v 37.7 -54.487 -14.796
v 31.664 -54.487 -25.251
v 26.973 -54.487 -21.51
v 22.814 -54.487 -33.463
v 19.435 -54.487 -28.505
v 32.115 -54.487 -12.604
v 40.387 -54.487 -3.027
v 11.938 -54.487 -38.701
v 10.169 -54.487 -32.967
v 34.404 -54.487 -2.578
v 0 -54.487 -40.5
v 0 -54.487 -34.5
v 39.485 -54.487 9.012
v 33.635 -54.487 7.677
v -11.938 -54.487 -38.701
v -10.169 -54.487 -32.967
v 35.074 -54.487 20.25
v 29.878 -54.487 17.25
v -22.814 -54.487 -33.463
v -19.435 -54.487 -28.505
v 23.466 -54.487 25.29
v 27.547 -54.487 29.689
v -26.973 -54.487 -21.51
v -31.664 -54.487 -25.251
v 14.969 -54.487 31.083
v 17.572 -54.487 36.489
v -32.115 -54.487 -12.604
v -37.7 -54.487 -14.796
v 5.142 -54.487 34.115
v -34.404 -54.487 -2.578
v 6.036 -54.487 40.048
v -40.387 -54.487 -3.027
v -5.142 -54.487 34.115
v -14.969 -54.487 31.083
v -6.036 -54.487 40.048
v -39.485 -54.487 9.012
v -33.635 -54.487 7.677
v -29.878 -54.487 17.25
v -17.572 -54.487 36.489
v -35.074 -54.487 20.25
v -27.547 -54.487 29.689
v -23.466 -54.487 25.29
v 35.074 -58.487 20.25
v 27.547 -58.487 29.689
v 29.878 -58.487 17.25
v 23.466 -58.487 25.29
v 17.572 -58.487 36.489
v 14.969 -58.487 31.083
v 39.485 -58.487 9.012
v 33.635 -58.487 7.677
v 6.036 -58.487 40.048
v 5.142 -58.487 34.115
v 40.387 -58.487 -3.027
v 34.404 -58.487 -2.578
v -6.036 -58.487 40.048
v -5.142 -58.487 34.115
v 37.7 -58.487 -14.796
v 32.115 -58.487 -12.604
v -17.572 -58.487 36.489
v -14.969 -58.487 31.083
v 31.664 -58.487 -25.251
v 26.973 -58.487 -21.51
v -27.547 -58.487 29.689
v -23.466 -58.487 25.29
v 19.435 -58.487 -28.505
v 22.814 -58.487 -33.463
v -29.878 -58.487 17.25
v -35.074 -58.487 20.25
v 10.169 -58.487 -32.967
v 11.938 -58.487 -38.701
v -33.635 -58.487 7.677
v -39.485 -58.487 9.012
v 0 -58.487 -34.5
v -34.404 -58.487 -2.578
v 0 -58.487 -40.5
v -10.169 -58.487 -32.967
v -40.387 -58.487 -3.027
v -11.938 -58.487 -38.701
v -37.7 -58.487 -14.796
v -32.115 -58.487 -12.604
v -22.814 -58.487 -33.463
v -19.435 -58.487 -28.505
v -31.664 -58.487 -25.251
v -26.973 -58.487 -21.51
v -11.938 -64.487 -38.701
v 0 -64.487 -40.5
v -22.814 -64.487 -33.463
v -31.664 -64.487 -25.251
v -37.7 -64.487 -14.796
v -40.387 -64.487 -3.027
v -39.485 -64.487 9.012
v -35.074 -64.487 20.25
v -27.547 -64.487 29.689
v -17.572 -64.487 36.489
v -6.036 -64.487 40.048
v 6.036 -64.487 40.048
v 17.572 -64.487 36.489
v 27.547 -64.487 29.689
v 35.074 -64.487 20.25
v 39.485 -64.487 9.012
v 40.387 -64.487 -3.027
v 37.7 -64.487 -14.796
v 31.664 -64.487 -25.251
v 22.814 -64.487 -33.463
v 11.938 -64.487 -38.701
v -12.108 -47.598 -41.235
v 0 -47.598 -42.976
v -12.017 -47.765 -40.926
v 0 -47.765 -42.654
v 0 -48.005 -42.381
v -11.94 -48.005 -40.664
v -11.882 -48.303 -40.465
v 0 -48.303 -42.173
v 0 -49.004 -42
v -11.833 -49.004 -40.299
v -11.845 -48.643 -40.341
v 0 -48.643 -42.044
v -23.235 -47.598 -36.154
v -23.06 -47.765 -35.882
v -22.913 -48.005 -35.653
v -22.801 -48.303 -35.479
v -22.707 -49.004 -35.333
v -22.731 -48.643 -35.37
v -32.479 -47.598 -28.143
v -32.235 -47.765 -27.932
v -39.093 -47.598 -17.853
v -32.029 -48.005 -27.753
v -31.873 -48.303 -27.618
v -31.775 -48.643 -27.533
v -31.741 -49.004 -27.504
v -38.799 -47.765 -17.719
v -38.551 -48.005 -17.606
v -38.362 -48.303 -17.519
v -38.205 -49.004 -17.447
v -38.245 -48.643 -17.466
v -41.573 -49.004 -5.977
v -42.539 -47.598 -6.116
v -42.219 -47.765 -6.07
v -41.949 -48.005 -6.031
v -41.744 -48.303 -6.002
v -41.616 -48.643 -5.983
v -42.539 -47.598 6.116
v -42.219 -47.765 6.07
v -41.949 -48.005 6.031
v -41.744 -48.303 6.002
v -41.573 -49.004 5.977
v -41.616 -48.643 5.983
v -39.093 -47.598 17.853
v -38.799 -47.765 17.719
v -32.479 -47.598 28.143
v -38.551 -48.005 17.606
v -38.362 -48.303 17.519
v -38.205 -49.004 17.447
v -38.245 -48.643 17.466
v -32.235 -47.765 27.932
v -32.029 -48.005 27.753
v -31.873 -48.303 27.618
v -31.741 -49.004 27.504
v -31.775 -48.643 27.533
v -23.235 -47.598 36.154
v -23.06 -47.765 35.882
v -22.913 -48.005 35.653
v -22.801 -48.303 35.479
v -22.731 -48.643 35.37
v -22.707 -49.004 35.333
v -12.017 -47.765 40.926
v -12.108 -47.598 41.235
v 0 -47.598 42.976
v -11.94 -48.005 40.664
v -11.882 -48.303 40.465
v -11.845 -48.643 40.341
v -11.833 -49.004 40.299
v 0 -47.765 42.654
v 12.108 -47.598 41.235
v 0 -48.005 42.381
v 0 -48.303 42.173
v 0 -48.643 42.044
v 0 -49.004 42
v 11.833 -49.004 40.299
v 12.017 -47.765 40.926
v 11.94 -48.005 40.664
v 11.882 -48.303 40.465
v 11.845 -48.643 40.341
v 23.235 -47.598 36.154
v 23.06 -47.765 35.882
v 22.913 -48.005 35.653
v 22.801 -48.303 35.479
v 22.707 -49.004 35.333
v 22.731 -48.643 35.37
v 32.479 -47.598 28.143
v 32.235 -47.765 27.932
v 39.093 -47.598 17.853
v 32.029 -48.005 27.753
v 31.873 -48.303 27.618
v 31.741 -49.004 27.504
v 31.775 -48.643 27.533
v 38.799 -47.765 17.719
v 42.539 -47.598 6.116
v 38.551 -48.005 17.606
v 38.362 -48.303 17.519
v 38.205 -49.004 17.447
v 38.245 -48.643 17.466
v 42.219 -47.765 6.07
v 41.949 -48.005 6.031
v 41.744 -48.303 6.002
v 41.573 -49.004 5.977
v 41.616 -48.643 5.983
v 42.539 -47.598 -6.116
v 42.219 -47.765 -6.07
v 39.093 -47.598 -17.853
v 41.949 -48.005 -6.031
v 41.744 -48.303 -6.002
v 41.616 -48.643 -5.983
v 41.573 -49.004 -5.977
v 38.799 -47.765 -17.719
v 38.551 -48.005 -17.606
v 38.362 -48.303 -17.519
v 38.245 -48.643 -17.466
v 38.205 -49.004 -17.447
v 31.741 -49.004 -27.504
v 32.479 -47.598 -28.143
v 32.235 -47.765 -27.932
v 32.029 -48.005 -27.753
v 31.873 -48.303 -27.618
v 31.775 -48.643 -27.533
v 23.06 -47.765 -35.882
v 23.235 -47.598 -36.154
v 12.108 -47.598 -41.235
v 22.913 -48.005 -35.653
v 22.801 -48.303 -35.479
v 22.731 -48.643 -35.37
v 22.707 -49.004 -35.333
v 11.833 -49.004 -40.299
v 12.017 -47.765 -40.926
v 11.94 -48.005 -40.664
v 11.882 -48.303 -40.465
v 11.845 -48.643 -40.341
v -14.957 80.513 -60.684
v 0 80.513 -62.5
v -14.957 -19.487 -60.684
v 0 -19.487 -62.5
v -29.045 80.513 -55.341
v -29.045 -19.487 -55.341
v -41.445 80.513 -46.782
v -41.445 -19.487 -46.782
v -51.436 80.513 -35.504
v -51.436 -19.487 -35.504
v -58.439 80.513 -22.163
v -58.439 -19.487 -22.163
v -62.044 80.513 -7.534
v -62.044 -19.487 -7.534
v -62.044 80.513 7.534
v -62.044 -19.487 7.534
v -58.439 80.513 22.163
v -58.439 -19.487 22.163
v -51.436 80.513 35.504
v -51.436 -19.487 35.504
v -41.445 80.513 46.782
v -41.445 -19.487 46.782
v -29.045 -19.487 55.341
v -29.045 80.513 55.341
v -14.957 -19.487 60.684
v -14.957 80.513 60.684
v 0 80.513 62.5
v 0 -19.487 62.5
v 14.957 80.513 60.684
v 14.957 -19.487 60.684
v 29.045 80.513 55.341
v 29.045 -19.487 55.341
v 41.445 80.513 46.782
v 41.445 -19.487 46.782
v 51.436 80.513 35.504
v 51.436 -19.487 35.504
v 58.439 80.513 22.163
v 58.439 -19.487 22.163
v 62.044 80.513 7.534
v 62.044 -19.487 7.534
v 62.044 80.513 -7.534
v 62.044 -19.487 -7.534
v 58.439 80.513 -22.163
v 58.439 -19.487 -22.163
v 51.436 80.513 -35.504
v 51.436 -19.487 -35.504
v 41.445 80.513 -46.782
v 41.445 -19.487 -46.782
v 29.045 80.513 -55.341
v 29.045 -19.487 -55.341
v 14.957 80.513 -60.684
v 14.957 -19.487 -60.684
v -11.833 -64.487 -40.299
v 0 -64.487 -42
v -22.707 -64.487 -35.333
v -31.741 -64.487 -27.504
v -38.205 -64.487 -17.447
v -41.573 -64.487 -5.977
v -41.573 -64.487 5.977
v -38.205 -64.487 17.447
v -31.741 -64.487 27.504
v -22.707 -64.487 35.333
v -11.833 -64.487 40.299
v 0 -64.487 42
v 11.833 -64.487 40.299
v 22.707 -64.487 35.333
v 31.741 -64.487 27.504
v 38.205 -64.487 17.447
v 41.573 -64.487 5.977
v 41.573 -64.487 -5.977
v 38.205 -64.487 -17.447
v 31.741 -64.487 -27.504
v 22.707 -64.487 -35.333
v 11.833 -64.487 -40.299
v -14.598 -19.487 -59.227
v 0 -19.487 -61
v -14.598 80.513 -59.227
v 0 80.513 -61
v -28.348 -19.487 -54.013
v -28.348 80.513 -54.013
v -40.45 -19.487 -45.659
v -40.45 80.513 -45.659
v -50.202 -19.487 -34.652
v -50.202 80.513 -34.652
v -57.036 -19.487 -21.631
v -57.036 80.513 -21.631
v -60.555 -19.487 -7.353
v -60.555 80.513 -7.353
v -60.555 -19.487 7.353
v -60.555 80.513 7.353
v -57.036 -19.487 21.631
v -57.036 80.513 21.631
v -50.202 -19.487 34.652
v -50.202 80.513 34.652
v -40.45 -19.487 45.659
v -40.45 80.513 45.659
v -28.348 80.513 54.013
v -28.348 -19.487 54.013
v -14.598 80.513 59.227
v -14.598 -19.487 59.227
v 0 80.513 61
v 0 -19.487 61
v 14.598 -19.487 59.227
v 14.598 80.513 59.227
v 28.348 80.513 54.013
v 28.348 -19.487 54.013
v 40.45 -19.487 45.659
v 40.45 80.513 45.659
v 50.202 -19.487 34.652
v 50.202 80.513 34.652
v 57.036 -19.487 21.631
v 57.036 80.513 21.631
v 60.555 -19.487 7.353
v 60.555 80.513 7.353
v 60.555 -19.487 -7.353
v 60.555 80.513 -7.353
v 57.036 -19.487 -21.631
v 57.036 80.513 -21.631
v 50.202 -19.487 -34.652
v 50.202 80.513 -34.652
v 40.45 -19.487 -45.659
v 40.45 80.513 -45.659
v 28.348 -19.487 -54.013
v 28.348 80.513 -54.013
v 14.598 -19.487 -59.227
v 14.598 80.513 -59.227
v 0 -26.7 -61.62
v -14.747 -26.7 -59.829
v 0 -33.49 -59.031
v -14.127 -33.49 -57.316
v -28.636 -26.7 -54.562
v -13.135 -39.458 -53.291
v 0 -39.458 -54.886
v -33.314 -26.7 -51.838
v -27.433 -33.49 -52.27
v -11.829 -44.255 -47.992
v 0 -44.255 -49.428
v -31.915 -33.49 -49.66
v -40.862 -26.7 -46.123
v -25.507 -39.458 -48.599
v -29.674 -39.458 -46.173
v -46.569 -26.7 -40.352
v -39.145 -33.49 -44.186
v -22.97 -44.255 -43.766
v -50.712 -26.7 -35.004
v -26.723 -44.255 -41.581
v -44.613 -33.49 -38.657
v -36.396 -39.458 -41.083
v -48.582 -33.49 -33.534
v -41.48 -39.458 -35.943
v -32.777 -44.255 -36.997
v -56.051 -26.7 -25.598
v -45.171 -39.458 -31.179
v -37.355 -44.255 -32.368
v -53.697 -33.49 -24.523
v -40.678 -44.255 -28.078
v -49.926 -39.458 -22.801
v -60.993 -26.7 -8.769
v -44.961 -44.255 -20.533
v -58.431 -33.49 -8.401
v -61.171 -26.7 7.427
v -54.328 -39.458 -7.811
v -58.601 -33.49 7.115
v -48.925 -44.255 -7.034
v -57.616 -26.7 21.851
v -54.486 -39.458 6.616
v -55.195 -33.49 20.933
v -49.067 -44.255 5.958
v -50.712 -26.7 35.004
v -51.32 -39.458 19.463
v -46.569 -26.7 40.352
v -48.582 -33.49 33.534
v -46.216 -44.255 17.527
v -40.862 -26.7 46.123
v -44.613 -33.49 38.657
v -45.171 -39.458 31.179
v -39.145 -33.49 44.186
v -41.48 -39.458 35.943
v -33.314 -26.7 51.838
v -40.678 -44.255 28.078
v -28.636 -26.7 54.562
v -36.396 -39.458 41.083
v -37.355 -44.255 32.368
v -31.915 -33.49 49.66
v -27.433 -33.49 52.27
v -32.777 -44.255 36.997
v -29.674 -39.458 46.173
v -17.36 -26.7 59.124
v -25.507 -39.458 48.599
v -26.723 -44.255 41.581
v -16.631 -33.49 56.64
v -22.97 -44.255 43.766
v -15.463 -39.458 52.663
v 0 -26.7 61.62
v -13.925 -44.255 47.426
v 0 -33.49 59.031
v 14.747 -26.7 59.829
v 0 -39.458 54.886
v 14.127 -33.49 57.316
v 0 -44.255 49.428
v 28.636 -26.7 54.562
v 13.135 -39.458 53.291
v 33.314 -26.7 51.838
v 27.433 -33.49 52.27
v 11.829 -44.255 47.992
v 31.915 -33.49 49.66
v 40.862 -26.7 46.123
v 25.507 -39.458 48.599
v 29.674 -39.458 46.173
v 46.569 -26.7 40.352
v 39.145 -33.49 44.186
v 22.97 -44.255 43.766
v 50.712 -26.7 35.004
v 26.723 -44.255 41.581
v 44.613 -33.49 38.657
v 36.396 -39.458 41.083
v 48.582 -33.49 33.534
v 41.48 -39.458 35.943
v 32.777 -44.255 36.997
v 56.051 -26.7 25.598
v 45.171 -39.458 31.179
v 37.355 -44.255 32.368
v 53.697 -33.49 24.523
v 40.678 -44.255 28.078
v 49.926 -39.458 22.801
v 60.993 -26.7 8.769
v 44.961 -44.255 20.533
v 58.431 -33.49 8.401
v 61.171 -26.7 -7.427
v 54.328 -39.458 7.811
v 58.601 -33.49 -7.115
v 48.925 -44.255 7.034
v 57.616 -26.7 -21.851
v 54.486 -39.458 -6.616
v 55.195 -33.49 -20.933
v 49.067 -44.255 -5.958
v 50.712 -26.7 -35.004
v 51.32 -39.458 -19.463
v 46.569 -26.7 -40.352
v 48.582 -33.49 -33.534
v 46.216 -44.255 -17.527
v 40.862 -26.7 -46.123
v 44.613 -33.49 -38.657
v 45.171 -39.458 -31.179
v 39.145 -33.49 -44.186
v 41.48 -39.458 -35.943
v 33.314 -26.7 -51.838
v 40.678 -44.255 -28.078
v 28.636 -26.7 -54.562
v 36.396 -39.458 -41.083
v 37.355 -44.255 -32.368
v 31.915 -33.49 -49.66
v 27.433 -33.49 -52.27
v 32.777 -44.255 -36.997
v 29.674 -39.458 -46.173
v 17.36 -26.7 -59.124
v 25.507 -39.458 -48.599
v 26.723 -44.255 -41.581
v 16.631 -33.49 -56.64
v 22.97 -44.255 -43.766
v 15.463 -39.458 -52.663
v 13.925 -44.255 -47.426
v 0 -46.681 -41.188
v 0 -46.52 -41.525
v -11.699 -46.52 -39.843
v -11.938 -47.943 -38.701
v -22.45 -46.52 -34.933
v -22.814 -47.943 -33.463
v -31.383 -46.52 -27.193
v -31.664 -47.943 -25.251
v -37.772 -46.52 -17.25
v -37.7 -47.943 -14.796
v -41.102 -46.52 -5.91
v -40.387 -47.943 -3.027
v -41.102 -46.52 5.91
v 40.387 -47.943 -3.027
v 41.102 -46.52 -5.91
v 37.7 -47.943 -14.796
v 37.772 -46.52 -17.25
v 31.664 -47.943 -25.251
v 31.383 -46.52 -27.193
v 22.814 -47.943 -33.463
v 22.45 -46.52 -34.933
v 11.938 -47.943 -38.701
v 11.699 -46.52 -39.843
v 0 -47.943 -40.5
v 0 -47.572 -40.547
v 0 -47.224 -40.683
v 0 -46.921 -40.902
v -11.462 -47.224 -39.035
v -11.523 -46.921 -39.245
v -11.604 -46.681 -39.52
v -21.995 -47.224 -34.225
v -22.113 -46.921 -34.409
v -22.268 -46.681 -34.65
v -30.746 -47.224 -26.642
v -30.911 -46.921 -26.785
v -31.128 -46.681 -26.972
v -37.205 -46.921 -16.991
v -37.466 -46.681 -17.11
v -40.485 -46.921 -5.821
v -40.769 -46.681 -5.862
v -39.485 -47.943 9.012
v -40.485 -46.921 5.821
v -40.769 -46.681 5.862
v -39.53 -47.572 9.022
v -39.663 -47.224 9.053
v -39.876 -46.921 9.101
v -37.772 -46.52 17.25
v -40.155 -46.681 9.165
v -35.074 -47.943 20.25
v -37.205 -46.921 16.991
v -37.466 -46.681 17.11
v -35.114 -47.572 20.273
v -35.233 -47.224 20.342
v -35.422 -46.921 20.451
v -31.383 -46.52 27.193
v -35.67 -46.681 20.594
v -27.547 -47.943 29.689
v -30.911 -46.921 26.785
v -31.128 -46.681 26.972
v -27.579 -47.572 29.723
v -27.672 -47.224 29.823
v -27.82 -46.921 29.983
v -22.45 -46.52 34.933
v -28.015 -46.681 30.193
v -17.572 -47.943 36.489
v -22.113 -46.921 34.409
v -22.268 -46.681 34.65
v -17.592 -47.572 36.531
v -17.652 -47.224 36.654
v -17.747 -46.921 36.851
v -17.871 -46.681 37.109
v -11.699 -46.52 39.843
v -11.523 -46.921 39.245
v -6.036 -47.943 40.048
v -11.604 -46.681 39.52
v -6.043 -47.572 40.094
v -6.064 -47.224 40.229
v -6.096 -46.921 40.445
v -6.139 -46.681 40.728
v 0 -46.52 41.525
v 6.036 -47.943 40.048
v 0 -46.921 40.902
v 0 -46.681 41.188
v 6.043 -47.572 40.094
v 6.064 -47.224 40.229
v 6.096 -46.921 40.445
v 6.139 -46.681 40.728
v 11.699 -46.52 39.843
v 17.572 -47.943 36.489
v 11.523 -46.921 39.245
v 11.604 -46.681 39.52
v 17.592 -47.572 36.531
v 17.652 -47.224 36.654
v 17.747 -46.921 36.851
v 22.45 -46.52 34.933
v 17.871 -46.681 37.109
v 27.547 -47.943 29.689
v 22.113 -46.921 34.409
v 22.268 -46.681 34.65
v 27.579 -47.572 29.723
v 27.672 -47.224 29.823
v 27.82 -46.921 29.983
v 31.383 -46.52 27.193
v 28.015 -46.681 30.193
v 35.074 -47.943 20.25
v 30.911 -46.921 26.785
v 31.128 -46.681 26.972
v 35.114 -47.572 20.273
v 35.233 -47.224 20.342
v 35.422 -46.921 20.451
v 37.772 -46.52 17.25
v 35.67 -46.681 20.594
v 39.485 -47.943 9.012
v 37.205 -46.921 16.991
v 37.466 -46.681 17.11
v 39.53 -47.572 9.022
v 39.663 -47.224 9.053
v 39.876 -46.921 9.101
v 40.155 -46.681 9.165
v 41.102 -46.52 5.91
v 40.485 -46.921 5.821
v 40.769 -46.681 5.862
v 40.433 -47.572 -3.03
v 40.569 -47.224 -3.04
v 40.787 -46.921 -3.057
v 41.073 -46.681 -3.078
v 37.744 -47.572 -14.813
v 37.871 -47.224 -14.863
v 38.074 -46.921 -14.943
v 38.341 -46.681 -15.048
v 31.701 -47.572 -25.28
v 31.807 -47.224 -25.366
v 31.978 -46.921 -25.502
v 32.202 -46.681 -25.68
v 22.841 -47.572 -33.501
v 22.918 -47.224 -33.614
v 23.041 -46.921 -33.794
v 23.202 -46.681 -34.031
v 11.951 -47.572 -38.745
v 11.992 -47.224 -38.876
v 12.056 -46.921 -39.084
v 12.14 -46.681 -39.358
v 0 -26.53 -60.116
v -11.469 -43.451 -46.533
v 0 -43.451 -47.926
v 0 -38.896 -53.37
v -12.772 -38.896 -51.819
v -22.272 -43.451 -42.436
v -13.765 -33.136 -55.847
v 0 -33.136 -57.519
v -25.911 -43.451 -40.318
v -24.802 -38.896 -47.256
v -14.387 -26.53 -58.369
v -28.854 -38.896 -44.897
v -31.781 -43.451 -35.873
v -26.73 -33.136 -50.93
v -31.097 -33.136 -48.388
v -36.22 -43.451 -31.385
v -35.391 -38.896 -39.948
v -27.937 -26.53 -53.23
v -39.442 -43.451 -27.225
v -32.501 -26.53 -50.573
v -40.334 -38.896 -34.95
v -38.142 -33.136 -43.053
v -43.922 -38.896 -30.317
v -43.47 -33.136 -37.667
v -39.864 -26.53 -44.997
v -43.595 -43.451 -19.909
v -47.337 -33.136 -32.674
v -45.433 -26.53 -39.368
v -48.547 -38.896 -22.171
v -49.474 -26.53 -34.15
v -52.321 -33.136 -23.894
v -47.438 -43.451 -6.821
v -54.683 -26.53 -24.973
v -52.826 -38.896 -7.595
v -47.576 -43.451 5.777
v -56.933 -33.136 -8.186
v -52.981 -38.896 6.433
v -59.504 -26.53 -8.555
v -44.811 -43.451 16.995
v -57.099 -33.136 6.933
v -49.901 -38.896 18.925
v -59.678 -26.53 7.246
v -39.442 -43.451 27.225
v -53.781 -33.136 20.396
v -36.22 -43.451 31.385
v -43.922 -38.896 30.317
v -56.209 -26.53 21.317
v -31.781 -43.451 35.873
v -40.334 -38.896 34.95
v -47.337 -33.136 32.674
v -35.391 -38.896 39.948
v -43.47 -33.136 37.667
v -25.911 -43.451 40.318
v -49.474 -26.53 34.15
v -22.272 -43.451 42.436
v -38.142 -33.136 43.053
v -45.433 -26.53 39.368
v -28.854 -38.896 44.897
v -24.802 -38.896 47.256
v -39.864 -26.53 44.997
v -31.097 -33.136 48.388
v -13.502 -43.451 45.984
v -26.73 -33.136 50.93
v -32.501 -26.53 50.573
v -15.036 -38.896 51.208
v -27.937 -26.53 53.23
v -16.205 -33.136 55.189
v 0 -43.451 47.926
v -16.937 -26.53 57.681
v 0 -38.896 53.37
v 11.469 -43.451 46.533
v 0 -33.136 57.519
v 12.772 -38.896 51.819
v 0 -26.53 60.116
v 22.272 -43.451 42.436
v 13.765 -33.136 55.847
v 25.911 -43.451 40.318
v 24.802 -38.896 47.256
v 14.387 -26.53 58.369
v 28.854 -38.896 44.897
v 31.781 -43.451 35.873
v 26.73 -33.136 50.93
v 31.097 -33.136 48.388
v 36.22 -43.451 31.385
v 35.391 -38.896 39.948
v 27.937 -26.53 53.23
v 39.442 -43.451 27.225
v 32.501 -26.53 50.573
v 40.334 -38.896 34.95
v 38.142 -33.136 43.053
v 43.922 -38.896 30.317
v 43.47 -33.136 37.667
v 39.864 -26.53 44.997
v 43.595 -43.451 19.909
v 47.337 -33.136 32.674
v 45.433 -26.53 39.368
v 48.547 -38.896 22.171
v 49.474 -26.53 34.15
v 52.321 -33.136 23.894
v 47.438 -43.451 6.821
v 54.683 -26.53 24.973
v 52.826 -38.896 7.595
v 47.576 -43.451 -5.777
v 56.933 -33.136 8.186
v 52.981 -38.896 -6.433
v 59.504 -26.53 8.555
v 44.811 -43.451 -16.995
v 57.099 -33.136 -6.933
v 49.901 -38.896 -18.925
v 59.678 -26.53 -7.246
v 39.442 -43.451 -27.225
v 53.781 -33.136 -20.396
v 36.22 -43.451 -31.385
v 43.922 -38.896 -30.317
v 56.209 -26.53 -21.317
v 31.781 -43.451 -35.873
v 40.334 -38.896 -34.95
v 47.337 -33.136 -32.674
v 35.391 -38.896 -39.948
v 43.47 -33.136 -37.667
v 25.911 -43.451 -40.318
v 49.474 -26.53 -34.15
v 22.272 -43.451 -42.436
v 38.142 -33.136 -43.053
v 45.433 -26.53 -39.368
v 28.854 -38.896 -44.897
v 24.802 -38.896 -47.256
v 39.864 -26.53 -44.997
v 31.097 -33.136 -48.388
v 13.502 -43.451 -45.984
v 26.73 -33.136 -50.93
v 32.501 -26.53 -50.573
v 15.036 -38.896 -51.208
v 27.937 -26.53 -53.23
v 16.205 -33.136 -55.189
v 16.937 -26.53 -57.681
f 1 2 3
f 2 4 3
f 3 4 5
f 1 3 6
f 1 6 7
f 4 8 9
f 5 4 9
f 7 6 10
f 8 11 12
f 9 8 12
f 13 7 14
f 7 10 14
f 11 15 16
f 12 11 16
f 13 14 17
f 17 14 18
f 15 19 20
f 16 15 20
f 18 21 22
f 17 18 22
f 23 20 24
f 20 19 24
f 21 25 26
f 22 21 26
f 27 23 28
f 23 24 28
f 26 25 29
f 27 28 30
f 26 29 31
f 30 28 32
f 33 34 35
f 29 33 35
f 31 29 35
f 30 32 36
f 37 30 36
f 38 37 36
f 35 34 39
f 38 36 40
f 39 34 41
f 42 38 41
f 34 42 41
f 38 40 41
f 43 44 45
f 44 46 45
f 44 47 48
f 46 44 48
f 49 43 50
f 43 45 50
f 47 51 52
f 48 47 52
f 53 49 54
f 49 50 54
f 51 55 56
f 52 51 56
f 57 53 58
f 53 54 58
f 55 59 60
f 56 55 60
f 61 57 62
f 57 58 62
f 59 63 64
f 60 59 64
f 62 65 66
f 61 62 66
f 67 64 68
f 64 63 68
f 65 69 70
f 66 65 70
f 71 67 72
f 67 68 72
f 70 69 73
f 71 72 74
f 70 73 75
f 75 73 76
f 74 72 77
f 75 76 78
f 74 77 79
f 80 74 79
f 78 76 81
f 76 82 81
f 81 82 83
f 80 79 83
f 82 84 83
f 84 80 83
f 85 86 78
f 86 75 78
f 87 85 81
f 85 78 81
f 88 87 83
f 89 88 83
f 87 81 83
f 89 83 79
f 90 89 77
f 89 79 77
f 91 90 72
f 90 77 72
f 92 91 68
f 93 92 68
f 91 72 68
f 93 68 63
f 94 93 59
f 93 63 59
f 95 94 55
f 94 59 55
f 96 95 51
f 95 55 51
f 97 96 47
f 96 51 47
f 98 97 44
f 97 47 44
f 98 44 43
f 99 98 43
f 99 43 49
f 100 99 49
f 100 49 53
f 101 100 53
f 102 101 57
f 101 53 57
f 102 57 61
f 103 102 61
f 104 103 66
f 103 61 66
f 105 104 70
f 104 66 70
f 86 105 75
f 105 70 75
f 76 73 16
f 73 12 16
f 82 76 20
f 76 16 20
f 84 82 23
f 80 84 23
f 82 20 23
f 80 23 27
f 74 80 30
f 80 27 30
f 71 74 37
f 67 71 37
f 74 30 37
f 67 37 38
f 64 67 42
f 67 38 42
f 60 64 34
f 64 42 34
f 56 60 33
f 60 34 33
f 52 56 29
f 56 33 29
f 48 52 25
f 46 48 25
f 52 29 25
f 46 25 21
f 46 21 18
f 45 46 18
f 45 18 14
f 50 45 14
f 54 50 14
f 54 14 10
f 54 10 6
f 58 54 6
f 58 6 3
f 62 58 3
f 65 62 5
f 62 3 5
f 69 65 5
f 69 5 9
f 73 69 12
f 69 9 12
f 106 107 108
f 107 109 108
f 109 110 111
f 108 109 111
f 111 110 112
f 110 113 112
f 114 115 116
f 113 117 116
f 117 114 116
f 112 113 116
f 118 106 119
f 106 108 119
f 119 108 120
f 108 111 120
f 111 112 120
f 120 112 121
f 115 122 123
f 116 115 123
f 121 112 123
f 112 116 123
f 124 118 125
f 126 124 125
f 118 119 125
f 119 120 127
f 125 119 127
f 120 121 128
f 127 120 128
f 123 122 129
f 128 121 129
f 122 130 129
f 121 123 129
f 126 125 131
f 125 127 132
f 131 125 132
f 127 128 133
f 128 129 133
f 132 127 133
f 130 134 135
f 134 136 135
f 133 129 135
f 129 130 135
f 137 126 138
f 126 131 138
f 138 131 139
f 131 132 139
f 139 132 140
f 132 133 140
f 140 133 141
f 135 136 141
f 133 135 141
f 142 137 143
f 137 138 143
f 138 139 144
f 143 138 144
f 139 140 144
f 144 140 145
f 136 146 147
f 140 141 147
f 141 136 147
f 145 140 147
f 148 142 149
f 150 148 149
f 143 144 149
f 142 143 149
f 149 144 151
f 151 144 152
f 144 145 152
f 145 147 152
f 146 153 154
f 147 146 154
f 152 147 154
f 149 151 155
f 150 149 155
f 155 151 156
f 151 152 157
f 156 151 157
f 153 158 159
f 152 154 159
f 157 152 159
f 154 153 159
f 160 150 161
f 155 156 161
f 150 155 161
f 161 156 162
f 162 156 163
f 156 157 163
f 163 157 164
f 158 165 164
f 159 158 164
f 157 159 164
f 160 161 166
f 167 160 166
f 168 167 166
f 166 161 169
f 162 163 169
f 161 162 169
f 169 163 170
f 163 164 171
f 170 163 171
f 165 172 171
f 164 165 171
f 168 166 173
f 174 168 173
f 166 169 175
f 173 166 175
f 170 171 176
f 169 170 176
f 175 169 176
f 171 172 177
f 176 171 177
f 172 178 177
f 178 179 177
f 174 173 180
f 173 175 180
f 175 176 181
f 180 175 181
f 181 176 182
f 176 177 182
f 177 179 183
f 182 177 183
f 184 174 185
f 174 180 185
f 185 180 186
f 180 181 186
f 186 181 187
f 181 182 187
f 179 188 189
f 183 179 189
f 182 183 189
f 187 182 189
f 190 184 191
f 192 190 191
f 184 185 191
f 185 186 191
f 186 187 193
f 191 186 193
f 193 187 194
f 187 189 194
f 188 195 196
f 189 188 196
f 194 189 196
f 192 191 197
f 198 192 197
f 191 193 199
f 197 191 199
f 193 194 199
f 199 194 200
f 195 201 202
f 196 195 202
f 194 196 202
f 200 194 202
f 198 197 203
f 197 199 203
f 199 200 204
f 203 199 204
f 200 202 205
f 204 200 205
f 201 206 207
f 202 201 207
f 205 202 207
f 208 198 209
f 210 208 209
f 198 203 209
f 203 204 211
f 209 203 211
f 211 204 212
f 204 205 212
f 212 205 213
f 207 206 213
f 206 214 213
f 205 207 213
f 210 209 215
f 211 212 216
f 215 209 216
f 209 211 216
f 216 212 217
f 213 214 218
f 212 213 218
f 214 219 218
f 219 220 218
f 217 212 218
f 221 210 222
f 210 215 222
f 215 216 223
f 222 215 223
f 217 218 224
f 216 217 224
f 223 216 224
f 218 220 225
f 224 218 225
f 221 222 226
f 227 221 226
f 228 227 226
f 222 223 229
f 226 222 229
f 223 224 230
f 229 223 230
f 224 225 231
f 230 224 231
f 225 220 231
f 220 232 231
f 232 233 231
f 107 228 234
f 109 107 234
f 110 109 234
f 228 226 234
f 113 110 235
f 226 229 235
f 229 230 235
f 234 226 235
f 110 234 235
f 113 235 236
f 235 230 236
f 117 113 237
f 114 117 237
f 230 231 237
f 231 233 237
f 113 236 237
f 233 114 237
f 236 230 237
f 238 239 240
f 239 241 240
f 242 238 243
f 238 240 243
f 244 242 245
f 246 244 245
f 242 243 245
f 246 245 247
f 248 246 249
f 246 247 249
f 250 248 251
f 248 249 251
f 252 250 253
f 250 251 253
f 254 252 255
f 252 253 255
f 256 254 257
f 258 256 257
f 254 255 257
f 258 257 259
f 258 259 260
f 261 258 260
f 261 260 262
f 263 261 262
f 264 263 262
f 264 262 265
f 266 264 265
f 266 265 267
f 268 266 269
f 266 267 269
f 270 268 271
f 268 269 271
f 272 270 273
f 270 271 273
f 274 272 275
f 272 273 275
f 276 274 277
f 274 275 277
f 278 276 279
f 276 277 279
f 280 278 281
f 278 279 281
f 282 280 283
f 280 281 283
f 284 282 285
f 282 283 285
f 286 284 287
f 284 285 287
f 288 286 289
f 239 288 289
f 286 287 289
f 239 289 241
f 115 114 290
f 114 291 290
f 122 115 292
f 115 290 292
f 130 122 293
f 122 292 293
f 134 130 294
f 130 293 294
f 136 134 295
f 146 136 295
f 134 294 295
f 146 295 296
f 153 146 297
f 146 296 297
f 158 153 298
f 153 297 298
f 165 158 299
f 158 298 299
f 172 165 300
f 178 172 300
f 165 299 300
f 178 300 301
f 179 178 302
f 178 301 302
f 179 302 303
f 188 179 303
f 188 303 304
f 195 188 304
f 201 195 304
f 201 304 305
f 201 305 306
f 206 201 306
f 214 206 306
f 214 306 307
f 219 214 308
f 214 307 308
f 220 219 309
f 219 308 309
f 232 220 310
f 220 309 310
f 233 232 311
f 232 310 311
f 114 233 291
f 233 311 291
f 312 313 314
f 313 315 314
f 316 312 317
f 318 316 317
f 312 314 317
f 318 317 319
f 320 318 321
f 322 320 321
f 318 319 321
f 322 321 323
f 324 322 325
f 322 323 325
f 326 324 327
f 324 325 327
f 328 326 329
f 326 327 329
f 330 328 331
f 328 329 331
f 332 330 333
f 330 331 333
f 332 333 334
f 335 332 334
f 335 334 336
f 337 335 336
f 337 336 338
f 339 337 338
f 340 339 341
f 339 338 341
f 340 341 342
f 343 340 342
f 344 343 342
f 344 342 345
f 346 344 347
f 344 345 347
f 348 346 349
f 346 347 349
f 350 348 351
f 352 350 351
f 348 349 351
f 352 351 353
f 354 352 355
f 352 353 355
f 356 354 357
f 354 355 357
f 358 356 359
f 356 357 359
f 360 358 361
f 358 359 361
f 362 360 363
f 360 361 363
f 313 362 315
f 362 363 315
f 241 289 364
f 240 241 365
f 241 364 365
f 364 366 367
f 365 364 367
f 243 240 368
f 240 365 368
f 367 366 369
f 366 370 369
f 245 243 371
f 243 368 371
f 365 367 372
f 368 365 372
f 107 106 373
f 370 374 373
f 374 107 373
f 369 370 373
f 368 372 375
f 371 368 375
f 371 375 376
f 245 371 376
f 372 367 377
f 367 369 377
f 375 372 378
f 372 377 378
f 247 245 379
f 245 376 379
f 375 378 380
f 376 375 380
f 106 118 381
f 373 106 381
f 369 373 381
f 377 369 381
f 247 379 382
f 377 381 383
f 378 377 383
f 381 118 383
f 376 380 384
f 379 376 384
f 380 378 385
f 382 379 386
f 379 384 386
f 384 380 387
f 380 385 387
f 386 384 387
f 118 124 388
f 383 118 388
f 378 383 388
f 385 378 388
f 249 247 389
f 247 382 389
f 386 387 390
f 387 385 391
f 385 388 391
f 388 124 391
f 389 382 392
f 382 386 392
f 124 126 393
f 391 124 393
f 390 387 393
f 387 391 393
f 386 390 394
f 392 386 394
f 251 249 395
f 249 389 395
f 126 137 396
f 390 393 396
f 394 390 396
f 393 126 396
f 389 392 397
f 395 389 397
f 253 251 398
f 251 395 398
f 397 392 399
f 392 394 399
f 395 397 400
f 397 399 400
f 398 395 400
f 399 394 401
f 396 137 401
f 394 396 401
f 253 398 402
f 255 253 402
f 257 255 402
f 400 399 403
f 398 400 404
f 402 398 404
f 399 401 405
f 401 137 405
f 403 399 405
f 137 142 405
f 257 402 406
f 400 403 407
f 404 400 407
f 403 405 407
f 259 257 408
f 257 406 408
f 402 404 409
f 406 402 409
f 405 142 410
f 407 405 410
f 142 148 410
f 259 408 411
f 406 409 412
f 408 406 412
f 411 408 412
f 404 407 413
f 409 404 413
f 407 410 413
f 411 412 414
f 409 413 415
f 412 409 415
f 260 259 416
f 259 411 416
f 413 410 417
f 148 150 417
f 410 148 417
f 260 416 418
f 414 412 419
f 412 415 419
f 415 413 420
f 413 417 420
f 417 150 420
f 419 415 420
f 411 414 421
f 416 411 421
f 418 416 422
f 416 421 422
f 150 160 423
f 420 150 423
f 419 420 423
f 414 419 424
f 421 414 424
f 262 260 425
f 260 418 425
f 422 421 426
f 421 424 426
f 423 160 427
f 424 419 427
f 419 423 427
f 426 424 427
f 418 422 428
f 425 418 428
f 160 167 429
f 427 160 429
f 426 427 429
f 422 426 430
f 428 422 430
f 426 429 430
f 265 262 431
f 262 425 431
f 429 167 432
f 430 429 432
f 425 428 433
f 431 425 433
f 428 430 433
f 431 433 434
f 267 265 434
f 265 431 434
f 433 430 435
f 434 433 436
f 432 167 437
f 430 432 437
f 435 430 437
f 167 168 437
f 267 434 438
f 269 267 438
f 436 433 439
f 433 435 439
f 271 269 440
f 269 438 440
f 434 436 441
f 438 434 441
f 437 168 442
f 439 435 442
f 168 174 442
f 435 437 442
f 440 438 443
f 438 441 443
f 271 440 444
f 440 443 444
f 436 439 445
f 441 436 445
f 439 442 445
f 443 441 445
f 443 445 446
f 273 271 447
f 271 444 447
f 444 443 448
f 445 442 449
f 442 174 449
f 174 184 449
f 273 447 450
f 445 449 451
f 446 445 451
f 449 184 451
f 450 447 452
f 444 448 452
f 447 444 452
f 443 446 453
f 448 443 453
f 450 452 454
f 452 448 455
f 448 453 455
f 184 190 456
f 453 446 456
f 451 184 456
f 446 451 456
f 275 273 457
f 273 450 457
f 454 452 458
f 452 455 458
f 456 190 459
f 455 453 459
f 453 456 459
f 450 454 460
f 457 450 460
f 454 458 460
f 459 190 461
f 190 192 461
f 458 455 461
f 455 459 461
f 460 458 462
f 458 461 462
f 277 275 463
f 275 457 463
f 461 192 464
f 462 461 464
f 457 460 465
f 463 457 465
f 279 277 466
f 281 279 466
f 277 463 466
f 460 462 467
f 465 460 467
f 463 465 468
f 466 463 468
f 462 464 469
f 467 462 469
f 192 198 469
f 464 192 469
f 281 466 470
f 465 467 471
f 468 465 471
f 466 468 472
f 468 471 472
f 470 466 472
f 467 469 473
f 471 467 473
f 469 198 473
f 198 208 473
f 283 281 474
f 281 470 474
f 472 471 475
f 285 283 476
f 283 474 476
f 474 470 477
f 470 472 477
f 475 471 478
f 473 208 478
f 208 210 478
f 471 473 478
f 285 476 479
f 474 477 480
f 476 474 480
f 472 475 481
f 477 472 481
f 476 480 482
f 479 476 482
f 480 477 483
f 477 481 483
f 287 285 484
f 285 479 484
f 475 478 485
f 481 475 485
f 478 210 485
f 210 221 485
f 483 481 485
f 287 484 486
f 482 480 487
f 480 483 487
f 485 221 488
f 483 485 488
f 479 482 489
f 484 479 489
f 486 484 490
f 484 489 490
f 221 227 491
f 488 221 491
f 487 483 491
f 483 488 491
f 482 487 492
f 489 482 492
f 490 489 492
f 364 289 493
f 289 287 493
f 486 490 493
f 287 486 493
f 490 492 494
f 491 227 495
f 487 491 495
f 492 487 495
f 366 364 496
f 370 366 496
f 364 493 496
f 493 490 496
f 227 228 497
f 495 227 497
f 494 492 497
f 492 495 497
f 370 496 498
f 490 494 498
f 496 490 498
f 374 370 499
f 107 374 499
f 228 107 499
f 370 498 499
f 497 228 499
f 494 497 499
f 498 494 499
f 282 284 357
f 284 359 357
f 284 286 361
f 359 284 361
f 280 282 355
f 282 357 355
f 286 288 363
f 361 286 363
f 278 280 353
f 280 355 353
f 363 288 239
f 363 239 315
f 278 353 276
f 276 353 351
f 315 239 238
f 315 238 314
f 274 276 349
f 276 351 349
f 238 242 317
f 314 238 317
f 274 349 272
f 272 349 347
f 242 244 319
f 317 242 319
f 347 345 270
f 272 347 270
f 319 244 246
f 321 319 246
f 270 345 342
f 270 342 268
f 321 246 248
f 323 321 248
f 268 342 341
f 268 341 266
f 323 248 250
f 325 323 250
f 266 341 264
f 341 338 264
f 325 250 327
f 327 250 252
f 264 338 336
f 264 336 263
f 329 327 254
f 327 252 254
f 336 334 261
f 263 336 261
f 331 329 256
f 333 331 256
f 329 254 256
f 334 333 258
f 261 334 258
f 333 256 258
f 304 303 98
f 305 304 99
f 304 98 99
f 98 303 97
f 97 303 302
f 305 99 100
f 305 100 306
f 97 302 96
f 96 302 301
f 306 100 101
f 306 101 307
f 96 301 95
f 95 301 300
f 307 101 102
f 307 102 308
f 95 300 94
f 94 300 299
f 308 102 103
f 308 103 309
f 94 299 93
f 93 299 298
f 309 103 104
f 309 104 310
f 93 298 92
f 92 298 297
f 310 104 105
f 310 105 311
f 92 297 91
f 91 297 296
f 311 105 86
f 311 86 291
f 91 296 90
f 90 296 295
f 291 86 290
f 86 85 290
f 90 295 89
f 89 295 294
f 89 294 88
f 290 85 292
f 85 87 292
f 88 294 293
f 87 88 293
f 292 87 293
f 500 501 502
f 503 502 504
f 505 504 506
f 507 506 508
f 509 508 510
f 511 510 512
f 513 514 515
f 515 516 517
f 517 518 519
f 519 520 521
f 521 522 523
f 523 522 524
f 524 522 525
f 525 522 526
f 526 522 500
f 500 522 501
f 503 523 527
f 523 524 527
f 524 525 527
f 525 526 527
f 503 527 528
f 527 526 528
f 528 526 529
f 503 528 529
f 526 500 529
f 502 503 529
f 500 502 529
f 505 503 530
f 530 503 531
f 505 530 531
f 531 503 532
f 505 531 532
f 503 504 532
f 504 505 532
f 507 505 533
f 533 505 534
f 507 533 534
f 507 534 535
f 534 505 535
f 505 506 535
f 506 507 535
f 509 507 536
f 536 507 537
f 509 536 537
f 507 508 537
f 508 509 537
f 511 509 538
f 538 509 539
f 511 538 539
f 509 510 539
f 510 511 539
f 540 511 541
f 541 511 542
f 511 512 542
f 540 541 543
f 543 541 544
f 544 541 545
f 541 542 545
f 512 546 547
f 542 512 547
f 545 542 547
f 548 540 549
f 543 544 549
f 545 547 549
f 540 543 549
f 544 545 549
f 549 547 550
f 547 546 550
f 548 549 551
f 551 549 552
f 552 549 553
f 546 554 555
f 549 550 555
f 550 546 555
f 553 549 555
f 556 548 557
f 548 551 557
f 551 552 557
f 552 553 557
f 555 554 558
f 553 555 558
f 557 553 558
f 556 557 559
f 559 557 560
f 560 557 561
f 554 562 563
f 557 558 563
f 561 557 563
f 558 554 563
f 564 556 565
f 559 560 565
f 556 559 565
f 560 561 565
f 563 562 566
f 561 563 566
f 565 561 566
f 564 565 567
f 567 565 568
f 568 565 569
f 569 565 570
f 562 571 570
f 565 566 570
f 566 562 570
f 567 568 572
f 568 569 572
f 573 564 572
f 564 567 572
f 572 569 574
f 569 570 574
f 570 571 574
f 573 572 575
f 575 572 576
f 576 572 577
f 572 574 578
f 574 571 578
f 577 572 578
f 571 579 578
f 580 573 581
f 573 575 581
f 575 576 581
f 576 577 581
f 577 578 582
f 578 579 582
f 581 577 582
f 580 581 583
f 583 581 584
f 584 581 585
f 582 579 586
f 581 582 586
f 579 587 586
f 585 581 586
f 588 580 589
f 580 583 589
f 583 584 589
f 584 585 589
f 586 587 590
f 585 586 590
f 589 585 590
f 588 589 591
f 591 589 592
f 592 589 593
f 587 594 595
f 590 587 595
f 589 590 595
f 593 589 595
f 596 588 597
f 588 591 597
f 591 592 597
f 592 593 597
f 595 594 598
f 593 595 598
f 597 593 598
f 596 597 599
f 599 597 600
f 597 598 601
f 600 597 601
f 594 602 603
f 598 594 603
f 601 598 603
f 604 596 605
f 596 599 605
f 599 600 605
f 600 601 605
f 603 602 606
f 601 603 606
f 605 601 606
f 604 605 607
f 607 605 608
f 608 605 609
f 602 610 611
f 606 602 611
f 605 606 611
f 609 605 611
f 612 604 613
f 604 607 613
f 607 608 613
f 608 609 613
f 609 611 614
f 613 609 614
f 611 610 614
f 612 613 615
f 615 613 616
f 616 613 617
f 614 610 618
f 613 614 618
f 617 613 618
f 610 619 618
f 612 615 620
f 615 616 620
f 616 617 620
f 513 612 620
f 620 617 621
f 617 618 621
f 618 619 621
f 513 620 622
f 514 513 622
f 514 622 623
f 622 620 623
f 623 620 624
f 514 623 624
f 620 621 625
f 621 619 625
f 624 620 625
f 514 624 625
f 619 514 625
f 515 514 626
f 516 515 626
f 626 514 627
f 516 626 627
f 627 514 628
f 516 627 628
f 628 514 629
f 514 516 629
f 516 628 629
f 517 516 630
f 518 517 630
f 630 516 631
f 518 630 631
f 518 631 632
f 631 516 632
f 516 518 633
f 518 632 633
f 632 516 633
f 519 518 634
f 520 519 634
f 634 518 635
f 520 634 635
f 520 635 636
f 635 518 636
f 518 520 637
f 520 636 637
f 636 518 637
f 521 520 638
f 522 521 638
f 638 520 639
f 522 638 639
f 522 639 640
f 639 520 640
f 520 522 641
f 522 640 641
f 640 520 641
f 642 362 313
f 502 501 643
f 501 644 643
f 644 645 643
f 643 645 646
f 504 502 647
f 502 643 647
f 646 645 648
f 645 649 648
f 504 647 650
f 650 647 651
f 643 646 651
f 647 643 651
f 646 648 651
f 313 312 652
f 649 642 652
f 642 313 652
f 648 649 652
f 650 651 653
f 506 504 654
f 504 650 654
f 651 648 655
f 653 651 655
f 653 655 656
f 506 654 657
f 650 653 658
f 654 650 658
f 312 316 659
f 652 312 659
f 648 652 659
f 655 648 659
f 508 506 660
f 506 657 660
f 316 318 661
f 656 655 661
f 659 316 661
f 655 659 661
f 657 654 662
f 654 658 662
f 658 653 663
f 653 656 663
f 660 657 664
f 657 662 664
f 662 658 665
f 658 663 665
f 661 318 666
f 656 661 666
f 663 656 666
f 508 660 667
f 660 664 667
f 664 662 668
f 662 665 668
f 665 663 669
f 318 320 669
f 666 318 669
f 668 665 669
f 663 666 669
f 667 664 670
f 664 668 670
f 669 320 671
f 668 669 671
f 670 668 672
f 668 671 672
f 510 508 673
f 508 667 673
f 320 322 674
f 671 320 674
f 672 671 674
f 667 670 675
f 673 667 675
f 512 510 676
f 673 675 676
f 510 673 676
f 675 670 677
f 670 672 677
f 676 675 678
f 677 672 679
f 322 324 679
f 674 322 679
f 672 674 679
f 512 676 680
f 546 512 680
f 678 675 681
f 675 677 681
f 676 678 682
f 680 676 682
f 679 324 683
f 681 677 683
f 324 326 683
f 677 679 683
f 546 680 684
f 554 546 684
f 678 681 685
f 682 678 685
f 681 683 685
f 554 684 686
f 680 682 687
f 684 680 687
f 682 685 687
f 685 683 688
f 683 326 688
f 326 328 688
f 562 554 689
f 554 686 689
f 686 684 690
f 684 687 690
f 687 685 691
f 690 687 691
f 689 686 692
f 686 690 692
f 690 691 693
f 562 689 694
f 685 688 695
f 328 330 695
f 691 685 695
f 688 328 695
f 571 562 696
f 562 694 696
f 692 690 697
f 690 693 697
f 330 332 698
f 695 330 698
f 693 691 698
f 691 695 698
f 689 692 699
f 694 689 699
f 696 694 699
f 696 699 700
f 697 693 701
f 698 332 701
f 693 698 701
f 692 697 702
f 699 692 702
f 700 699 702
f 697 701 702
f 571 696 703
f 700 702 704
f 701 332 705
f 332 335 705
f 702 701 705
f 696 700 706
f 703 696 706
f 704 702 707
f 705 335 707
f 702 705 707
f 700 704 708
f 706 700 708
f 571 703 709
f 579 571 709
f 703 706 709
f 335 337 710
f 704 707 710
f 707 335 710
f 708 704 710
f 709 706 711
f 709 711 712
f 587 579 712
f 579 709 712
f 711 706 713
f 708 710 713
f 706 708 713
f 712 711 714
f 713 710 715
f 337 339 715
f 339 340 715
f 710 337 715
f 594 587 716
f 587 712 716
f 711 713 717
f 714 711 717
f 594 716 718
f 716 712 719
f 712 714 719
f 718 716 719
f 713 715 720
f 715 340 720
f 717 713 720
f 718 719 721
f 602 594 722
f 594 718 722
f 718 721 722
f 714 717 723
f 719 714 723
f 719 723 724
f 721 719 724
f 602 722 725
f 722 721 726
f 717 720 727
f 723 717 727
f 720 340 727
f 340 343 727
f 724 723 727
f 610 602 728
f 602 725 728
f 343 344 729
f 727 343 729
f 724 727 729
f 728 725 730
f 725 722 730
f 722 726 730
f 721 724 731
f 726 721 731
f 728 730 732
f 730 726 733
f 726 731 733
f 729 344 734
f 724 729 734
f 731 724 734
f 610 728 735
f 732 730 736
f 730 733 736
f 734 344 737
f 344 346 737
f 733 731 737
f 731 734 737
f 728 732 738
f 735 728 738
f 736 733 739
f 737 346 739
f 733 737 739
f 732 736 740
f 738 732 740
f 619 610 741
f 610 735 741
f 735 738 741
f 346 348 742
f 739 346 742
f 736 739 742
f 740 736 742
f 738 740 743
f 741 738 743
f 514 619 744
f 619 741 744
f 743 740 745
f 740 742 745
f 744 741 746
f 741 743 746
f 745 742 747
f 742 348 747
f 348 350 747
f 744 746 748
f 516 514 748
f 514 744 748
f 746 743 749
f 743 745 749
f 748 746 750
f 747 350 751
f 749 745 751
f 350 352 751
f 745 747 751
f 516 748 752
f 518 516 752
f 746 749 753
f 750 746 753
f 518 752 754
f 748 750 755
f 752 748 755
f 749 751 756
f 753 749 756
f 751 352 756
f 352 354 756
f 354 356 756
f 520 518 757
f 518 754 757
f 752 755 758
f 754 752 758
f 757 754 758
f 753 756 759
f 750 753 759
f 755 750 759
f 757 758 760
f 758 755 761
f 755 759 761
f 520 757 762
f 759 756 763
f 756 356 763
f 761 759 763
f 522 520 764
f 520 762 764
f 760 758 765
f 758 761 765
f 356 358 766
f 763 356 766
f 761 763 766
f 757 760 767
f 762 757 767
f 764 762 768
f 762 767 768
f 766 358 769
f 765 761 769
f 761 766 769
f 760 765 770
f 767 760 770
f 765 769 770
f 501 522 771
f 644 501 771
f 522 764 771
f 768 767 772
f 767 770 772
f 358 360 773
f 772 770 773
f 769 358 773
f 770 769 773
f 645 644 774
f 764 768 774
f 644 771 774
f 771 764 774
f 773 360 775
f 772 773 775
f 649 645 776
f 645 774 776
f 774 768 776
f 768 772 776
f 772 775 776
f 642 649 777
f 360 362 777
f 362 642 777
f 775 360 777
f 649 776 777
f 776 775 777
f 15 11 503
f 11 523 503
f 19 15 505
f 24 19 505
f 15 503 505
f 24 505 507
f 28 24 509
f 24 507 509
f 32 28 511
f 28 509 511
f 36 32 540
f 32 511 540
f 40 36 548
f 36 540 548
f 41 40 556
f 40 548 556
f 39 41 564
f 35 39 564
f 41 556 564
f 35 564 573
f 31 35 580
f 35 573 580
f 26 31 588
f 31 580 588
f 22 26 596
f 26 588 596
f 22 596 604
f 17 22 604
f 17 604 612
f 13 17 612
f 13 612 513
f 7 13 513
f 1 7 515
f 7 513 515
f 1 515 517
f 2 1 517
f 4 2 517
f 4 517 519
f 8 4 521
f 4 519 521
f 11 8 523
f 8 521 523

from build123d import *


with BuildPart() as part:
    # Çizim1 → Döndür5 (revolve)
    with BuildSketch(Plane.XY, mode=Mode.PRIVATE) as d_nd_r5_sk:
        with BuildLine():
            Line((-62.5, 80.513349387), (-62.5, -19.486650613))
            ThreePointArc((-62.5, -19.486650613), (-57.140269015, -36.599719971), (-42.976190476, -47.598026124))
            ThreePointArc((-42.976190476, -47.598026124), (-42.267986549, -48.147941431), (-42, -49.003594899))
            Line((-42, -49.003594899), (-42, -64.486650613))
            Line((-42, -64.486650613), (-40.5, -64.486650613))
            Line((-40.5, -64.486650613), (-40.5, -58.486650613))
            Line((-40.5, -58.486650613), (-34.5, -58.486650613))
            Line((-34.5, -58.486650613), (-34.5, -54.486650613))
            Line((-34.5, -54.486650613), (-40.5, -54.486650613))
            Line((-40.5, -54.486650613), (-40.5, -47.942757163))
            ThreePointArc((-40.5, -47.942757163), (-40.782933856, -47.065973267), (-41.525, -46.519951836))
            ThreePointArc((-41.525, -46.519951836), (-55.624256745, -36.145544634), (-61, -19.486650613))
            Line((-61, -19.486650613), (-61, 80.513349387))
            Line((-61, 80.513349387), (-62.5, 80.513349387))
        make_face()
    revolve(d_nd_r5_sk.sketch.rotate(Axis((0, 0, 0), (0, 1, 0)), 270), axis=Axis((0, 0, 0), (0, 1, 0)))


solid = part.part
